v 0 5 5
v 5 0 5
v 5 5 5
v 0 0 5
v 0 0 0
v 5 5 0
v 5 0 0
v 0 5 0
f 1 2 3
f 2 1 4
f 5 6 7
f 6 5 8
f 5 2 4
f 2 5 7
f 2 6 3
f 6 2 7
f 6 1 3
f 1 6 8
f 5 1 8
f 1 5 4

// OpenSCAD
// a customizer whose defaults are 0 (thing 193941): sphere(0) is empty in OpenSCAD, and so is a
// hull of nothing but them — it must not take the rest of the model down with it.
for (x = [0, 5], y = [0, 5]) hull() {
  translate([x, y, 0]) sphere(0);
  translate([x, y, 3]) sphere(0);
}
cube(5);
